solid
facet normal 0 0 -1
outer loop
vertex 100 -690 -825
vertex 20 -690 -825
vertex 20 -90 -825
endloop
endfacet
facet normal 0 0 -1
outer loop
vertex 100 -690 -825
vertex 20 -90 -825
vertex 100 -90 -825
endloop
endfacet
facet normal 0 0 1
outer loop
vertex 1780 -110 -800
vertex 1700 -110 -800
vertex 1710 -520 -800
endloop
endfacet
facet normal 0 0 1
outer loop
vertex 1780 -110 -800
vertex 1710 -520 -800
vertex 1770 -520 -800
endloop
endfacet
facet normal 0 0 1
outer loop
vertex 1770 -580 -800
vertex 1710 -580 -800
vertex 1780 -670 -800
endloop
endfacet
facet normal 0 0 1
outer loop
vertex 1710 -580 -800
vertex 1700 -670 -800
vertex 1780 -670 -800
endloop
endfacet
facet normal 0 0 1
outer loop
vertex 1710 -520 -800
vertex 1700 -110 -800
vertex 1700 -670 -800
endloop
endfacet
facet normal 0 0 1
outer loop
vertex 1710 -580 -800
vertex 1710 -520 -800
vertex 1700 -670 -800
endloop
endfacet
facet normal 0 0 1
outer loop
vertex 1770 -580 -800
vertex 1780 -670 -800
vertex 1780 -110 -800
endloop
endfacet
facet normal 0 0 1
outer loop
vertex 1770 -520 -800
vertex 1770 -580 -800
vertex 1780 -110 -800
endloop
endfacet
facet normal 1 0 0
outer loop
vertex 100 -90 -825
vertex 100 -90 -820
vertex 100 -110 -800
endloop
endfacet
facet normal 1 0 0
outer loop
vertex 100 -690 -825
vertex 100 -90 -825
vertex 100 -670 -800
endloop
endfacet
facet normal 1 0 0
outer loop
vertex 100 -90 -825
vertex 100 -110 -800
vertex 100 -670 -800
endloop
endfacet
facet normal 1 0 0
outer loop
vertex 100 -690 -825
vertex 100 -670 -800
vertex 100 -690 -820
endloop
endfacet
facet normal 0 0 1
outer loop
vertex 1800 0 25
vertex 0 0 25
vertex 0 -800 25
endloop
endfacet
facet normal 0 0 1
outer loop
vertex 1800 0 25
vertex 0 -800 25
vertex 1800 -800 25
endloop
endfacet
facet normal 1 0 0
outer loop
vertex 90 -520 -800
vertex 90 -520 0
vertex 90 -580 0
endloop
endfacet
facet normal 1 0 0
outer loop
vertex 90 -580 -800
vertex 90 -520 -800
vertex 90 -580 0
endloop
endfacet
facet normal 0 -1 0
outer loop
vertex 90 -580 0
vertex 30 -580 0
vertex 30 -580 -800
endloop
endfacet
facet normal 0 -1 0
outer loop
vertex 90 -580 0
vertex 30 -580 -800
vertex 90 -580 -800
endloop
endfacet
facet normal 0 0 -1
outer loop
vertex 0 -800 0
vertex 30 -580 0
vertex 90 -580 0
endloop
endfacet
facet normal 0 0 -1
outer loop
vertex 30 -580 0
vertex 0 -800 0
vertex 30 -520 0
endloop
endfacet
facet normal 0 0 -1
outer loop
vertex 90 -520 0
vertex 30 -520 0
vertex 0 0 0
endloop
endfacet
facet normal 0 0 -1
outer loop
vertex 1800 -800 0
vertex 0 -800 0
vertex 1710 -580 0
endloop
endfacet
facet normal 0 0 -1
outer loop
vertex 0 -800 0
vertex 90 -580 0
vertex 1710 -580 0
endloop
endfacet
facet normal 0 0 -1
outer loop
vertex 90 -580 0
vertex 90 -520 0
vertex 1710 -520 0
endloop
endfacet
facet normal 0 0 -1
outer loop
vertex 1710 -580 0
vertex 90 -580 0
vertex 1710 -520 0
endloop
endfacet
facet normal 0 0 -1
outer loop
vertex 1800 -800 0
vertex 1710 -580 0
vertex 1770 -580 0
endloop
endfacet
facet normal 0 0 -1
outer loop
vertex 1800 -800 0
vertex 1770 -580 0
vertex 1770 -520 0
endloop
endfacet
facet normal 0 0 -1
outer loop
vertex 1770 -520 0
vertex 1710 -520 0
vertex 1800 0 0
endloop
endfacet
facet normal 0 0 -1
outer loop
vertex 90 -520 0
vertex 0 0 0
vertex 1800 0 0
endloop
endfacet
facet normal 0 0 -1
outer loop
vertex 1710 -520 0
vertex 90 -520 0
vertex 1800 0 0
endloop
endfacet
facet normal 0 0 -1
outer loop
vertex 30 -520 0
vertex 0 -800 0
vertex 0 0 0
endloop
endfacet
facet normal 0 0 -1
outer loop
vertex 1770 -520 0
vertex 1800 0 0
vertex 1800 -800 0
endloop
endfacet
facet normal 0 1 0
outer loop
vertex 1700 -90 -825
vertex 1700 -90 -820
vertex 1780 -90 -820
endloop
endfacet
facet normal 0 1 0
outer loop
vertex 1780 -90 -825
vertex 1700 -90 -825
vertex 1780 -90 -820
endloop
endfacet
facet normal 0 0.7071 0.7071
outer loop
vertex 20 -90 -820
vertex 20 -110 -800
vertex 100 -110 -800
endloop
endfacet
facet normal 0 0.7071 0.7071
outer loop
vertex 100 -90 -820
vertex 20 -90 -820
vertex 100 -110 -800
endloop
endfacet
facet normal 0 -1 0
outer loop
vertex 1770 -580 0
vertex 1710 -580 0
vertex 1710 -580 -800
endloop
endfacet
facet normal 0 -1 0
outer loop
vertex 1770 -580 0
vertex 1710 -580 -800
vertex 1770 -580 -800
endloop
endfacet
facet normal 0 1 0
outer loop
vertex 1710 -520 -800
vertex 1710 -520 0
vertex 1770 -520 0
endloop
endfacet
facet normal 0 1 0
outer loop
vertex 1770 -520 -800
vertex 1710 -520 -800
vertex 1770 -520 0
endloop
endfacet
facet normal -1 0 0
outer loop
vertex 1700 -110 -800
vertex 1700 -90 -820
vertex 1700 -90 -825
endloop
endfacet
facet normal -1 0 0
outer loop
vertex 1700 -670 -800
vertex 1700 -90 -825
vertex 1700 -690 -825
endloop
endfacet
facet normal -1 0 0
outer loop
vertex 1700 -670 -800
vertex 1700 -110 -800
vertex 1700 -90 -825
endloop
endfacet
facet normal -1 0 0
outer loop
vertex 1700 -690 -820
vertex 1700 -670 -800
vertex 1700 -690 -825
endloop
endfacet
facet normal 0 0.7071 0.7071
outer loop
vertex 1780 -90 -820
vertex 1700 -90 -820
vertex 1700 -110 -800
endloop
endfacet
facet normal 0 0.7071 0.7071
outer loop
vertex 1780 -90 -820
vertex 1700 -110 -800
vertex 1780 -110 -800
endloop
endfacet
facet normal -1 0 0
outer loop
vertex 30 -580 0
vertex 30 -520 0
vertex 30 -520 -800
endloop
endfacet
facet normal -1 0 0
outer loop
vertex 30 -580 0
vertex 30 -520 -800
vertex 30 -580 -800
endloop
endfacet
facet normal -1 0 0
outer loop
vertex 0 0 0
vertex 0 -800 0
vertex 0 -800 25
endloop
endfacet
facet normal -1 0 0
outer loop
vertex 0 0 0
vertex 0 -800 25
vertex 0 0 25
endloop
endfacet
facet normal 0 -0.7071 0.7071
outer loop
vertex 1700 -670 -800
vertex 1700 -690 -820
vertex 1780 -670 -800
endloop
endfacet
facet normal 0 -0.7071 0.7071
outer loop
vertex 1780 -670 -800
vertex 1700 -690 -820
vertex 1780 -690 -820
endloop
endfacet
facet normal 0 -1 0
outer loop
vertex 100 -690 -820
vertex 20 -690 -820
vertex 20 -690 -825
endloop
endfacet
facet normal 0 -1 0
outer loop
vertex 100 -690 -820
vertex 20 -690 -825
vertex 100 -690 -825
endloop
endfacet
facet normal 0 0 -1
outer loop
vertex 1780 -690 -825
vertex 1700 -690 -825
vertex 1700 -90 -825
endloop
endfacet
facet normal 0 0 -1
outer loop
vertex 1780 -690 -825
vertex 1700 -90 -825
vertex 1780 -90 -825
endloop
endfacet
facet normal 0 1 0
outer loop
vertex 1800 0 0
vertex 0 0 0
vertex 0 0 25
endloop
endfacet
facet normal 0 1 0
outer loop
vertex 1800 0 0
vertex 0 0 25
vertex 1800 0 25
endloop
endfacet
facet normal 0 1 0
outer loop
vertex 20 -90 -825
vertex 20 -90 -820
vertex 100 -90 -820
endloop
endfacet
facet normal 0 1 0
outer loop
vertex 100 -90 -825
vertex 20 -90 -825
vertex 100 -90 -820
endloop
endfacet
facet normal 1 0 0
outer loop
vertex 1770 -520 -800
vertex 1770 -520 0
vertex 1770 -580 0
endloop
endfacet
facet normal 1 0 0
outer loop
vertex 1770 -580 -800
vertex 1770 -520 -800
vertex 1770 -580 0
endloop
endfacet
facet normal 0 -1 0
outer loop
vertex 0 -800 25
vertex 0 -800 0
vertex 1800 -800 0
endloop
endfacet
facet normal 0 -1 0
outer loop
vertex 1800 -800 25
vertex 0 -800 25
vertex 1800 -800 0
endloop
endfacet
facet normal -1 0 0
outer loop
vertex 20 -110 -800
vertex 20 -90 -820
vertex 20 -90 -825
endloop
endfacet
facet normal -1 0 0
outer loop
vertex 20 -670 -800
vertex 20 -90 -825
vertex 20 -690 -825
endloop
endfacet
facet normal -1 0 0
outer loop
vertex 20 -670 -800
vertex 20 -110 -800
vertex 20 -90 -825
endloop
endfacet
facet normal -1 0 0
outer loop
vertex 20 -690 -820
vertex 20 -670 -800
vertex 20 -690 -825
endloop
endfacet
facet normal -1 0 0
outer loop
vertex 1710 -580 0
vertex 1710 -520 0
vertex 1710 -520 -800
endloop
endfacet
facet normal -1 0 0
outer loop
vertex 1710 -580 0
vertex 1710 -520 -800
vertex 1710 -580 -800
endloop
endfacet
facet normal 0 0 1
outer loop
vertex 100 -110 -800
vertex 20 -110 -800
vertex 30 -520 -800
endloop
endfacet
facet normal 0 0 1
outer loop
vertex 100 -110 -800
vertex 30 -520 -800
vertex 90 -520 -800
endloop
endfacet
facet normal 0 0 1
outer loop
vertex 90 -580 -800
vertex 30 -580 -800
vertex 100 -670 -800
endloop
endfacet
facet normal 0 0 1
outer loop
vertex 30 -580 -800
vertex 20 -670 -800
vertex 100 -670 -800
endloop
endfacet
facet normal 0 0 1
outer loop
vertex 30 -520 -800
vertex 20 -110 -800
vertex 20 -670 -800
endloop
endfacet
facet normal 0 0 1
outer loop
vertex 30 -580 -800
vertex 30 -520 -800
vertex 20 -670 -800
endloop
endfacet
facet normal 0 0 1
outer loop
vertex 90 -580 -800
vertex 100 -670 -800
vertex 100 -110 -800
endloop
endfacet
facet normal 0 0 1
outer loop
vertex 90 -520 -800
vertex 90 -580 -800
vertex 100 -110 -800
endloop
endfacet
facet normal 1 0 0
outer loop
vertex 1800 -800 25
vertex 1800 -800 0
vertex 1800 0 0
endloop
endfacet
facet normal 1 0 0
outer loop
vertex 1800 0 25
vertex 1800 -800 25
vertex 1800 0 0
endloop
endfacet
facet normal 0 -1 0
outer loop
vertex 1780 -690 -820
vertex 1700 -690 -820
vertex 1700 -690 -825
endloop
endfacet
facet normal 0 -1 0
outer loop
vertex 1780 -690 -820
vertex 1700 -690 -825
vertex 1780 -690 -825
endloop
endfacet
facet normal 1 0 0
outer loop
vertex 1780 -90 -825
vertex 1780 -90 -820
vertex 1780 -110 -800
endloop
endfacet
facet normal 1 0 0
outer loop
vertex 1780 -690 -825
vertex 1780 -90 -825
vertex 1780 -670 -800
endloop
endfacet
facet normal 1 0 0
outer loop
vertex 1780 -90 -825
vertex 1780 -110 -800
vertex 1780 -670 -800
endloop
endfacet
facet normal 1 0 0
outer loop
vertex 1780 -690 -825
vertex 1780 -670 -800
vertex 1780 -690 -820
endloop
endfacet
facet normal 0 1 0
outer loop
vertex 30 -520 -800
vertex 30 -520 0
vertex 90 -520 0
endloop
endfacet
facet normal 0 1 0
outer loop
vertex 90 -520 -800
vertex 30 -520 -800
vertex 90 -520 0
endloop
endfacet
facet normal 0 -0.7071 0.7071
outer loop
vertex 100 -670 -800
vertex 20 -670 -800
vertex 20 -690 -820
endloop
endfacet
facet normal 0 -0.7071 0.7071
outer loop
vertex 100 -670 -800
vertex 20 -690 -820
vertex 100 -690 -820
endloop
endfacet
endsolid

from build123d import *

# Parameters (mm, degrees)
F0_W     = 1800
F0_H     = 800
F1_DEPTH = 25
F2_W     = 60
F2_H     = 60
F3_DEPTH = 800
F4_W     = 80
F4_H     = 600
F5_DEPTH = 25
F6_SIZE  = 20


with BuildPart() as f1:
    # F0 (on Top) → F1 (new body)
    with BuildSketch(Plane.XY):
        with Locations((900, -400)):
            Rectangle(F0_W, F0_H)
    extrude(amount=F1_DEPTH)

    # F2 (on face) → F3 (join)
    with BuildSketch(Plane(origin=(0, 0, 0), x_dir=(1, 0, 0), z_dir=(0, 0, -1))):
        with Locations((60, 550)):
            Rectangle(F2_W, F2_H)
        with Locations((1740, 550)):
            Rectangle(F2_W, F2_H)
    extrude(amount=F3_DEPTH)

    # F4 (on face) → F5 (join)
    with BuildSketch(Plane(origin=(0, 0, -800), x_dir=(1, 0, 0), z_dir=(0, 0, -1))):
        with Locations((60, 390)):
            Rectangle(F4_W, F4_H)
        with Locations((1740, 390)):
            Rectangle(F4_W, F4_H)
    extrude(amount=F5_DEPTH)

    # F6
    f6_edges = [f1.edges().sort_by_distance(p)[0] for p in [
        (1740, -90, -800),
        (60, -90, -800),
        (60, -690, -800),
        (1740, -690, -800),
    ]]
    chamfer(f6_edges, length=F6_SIZE)


solid = f1.part
